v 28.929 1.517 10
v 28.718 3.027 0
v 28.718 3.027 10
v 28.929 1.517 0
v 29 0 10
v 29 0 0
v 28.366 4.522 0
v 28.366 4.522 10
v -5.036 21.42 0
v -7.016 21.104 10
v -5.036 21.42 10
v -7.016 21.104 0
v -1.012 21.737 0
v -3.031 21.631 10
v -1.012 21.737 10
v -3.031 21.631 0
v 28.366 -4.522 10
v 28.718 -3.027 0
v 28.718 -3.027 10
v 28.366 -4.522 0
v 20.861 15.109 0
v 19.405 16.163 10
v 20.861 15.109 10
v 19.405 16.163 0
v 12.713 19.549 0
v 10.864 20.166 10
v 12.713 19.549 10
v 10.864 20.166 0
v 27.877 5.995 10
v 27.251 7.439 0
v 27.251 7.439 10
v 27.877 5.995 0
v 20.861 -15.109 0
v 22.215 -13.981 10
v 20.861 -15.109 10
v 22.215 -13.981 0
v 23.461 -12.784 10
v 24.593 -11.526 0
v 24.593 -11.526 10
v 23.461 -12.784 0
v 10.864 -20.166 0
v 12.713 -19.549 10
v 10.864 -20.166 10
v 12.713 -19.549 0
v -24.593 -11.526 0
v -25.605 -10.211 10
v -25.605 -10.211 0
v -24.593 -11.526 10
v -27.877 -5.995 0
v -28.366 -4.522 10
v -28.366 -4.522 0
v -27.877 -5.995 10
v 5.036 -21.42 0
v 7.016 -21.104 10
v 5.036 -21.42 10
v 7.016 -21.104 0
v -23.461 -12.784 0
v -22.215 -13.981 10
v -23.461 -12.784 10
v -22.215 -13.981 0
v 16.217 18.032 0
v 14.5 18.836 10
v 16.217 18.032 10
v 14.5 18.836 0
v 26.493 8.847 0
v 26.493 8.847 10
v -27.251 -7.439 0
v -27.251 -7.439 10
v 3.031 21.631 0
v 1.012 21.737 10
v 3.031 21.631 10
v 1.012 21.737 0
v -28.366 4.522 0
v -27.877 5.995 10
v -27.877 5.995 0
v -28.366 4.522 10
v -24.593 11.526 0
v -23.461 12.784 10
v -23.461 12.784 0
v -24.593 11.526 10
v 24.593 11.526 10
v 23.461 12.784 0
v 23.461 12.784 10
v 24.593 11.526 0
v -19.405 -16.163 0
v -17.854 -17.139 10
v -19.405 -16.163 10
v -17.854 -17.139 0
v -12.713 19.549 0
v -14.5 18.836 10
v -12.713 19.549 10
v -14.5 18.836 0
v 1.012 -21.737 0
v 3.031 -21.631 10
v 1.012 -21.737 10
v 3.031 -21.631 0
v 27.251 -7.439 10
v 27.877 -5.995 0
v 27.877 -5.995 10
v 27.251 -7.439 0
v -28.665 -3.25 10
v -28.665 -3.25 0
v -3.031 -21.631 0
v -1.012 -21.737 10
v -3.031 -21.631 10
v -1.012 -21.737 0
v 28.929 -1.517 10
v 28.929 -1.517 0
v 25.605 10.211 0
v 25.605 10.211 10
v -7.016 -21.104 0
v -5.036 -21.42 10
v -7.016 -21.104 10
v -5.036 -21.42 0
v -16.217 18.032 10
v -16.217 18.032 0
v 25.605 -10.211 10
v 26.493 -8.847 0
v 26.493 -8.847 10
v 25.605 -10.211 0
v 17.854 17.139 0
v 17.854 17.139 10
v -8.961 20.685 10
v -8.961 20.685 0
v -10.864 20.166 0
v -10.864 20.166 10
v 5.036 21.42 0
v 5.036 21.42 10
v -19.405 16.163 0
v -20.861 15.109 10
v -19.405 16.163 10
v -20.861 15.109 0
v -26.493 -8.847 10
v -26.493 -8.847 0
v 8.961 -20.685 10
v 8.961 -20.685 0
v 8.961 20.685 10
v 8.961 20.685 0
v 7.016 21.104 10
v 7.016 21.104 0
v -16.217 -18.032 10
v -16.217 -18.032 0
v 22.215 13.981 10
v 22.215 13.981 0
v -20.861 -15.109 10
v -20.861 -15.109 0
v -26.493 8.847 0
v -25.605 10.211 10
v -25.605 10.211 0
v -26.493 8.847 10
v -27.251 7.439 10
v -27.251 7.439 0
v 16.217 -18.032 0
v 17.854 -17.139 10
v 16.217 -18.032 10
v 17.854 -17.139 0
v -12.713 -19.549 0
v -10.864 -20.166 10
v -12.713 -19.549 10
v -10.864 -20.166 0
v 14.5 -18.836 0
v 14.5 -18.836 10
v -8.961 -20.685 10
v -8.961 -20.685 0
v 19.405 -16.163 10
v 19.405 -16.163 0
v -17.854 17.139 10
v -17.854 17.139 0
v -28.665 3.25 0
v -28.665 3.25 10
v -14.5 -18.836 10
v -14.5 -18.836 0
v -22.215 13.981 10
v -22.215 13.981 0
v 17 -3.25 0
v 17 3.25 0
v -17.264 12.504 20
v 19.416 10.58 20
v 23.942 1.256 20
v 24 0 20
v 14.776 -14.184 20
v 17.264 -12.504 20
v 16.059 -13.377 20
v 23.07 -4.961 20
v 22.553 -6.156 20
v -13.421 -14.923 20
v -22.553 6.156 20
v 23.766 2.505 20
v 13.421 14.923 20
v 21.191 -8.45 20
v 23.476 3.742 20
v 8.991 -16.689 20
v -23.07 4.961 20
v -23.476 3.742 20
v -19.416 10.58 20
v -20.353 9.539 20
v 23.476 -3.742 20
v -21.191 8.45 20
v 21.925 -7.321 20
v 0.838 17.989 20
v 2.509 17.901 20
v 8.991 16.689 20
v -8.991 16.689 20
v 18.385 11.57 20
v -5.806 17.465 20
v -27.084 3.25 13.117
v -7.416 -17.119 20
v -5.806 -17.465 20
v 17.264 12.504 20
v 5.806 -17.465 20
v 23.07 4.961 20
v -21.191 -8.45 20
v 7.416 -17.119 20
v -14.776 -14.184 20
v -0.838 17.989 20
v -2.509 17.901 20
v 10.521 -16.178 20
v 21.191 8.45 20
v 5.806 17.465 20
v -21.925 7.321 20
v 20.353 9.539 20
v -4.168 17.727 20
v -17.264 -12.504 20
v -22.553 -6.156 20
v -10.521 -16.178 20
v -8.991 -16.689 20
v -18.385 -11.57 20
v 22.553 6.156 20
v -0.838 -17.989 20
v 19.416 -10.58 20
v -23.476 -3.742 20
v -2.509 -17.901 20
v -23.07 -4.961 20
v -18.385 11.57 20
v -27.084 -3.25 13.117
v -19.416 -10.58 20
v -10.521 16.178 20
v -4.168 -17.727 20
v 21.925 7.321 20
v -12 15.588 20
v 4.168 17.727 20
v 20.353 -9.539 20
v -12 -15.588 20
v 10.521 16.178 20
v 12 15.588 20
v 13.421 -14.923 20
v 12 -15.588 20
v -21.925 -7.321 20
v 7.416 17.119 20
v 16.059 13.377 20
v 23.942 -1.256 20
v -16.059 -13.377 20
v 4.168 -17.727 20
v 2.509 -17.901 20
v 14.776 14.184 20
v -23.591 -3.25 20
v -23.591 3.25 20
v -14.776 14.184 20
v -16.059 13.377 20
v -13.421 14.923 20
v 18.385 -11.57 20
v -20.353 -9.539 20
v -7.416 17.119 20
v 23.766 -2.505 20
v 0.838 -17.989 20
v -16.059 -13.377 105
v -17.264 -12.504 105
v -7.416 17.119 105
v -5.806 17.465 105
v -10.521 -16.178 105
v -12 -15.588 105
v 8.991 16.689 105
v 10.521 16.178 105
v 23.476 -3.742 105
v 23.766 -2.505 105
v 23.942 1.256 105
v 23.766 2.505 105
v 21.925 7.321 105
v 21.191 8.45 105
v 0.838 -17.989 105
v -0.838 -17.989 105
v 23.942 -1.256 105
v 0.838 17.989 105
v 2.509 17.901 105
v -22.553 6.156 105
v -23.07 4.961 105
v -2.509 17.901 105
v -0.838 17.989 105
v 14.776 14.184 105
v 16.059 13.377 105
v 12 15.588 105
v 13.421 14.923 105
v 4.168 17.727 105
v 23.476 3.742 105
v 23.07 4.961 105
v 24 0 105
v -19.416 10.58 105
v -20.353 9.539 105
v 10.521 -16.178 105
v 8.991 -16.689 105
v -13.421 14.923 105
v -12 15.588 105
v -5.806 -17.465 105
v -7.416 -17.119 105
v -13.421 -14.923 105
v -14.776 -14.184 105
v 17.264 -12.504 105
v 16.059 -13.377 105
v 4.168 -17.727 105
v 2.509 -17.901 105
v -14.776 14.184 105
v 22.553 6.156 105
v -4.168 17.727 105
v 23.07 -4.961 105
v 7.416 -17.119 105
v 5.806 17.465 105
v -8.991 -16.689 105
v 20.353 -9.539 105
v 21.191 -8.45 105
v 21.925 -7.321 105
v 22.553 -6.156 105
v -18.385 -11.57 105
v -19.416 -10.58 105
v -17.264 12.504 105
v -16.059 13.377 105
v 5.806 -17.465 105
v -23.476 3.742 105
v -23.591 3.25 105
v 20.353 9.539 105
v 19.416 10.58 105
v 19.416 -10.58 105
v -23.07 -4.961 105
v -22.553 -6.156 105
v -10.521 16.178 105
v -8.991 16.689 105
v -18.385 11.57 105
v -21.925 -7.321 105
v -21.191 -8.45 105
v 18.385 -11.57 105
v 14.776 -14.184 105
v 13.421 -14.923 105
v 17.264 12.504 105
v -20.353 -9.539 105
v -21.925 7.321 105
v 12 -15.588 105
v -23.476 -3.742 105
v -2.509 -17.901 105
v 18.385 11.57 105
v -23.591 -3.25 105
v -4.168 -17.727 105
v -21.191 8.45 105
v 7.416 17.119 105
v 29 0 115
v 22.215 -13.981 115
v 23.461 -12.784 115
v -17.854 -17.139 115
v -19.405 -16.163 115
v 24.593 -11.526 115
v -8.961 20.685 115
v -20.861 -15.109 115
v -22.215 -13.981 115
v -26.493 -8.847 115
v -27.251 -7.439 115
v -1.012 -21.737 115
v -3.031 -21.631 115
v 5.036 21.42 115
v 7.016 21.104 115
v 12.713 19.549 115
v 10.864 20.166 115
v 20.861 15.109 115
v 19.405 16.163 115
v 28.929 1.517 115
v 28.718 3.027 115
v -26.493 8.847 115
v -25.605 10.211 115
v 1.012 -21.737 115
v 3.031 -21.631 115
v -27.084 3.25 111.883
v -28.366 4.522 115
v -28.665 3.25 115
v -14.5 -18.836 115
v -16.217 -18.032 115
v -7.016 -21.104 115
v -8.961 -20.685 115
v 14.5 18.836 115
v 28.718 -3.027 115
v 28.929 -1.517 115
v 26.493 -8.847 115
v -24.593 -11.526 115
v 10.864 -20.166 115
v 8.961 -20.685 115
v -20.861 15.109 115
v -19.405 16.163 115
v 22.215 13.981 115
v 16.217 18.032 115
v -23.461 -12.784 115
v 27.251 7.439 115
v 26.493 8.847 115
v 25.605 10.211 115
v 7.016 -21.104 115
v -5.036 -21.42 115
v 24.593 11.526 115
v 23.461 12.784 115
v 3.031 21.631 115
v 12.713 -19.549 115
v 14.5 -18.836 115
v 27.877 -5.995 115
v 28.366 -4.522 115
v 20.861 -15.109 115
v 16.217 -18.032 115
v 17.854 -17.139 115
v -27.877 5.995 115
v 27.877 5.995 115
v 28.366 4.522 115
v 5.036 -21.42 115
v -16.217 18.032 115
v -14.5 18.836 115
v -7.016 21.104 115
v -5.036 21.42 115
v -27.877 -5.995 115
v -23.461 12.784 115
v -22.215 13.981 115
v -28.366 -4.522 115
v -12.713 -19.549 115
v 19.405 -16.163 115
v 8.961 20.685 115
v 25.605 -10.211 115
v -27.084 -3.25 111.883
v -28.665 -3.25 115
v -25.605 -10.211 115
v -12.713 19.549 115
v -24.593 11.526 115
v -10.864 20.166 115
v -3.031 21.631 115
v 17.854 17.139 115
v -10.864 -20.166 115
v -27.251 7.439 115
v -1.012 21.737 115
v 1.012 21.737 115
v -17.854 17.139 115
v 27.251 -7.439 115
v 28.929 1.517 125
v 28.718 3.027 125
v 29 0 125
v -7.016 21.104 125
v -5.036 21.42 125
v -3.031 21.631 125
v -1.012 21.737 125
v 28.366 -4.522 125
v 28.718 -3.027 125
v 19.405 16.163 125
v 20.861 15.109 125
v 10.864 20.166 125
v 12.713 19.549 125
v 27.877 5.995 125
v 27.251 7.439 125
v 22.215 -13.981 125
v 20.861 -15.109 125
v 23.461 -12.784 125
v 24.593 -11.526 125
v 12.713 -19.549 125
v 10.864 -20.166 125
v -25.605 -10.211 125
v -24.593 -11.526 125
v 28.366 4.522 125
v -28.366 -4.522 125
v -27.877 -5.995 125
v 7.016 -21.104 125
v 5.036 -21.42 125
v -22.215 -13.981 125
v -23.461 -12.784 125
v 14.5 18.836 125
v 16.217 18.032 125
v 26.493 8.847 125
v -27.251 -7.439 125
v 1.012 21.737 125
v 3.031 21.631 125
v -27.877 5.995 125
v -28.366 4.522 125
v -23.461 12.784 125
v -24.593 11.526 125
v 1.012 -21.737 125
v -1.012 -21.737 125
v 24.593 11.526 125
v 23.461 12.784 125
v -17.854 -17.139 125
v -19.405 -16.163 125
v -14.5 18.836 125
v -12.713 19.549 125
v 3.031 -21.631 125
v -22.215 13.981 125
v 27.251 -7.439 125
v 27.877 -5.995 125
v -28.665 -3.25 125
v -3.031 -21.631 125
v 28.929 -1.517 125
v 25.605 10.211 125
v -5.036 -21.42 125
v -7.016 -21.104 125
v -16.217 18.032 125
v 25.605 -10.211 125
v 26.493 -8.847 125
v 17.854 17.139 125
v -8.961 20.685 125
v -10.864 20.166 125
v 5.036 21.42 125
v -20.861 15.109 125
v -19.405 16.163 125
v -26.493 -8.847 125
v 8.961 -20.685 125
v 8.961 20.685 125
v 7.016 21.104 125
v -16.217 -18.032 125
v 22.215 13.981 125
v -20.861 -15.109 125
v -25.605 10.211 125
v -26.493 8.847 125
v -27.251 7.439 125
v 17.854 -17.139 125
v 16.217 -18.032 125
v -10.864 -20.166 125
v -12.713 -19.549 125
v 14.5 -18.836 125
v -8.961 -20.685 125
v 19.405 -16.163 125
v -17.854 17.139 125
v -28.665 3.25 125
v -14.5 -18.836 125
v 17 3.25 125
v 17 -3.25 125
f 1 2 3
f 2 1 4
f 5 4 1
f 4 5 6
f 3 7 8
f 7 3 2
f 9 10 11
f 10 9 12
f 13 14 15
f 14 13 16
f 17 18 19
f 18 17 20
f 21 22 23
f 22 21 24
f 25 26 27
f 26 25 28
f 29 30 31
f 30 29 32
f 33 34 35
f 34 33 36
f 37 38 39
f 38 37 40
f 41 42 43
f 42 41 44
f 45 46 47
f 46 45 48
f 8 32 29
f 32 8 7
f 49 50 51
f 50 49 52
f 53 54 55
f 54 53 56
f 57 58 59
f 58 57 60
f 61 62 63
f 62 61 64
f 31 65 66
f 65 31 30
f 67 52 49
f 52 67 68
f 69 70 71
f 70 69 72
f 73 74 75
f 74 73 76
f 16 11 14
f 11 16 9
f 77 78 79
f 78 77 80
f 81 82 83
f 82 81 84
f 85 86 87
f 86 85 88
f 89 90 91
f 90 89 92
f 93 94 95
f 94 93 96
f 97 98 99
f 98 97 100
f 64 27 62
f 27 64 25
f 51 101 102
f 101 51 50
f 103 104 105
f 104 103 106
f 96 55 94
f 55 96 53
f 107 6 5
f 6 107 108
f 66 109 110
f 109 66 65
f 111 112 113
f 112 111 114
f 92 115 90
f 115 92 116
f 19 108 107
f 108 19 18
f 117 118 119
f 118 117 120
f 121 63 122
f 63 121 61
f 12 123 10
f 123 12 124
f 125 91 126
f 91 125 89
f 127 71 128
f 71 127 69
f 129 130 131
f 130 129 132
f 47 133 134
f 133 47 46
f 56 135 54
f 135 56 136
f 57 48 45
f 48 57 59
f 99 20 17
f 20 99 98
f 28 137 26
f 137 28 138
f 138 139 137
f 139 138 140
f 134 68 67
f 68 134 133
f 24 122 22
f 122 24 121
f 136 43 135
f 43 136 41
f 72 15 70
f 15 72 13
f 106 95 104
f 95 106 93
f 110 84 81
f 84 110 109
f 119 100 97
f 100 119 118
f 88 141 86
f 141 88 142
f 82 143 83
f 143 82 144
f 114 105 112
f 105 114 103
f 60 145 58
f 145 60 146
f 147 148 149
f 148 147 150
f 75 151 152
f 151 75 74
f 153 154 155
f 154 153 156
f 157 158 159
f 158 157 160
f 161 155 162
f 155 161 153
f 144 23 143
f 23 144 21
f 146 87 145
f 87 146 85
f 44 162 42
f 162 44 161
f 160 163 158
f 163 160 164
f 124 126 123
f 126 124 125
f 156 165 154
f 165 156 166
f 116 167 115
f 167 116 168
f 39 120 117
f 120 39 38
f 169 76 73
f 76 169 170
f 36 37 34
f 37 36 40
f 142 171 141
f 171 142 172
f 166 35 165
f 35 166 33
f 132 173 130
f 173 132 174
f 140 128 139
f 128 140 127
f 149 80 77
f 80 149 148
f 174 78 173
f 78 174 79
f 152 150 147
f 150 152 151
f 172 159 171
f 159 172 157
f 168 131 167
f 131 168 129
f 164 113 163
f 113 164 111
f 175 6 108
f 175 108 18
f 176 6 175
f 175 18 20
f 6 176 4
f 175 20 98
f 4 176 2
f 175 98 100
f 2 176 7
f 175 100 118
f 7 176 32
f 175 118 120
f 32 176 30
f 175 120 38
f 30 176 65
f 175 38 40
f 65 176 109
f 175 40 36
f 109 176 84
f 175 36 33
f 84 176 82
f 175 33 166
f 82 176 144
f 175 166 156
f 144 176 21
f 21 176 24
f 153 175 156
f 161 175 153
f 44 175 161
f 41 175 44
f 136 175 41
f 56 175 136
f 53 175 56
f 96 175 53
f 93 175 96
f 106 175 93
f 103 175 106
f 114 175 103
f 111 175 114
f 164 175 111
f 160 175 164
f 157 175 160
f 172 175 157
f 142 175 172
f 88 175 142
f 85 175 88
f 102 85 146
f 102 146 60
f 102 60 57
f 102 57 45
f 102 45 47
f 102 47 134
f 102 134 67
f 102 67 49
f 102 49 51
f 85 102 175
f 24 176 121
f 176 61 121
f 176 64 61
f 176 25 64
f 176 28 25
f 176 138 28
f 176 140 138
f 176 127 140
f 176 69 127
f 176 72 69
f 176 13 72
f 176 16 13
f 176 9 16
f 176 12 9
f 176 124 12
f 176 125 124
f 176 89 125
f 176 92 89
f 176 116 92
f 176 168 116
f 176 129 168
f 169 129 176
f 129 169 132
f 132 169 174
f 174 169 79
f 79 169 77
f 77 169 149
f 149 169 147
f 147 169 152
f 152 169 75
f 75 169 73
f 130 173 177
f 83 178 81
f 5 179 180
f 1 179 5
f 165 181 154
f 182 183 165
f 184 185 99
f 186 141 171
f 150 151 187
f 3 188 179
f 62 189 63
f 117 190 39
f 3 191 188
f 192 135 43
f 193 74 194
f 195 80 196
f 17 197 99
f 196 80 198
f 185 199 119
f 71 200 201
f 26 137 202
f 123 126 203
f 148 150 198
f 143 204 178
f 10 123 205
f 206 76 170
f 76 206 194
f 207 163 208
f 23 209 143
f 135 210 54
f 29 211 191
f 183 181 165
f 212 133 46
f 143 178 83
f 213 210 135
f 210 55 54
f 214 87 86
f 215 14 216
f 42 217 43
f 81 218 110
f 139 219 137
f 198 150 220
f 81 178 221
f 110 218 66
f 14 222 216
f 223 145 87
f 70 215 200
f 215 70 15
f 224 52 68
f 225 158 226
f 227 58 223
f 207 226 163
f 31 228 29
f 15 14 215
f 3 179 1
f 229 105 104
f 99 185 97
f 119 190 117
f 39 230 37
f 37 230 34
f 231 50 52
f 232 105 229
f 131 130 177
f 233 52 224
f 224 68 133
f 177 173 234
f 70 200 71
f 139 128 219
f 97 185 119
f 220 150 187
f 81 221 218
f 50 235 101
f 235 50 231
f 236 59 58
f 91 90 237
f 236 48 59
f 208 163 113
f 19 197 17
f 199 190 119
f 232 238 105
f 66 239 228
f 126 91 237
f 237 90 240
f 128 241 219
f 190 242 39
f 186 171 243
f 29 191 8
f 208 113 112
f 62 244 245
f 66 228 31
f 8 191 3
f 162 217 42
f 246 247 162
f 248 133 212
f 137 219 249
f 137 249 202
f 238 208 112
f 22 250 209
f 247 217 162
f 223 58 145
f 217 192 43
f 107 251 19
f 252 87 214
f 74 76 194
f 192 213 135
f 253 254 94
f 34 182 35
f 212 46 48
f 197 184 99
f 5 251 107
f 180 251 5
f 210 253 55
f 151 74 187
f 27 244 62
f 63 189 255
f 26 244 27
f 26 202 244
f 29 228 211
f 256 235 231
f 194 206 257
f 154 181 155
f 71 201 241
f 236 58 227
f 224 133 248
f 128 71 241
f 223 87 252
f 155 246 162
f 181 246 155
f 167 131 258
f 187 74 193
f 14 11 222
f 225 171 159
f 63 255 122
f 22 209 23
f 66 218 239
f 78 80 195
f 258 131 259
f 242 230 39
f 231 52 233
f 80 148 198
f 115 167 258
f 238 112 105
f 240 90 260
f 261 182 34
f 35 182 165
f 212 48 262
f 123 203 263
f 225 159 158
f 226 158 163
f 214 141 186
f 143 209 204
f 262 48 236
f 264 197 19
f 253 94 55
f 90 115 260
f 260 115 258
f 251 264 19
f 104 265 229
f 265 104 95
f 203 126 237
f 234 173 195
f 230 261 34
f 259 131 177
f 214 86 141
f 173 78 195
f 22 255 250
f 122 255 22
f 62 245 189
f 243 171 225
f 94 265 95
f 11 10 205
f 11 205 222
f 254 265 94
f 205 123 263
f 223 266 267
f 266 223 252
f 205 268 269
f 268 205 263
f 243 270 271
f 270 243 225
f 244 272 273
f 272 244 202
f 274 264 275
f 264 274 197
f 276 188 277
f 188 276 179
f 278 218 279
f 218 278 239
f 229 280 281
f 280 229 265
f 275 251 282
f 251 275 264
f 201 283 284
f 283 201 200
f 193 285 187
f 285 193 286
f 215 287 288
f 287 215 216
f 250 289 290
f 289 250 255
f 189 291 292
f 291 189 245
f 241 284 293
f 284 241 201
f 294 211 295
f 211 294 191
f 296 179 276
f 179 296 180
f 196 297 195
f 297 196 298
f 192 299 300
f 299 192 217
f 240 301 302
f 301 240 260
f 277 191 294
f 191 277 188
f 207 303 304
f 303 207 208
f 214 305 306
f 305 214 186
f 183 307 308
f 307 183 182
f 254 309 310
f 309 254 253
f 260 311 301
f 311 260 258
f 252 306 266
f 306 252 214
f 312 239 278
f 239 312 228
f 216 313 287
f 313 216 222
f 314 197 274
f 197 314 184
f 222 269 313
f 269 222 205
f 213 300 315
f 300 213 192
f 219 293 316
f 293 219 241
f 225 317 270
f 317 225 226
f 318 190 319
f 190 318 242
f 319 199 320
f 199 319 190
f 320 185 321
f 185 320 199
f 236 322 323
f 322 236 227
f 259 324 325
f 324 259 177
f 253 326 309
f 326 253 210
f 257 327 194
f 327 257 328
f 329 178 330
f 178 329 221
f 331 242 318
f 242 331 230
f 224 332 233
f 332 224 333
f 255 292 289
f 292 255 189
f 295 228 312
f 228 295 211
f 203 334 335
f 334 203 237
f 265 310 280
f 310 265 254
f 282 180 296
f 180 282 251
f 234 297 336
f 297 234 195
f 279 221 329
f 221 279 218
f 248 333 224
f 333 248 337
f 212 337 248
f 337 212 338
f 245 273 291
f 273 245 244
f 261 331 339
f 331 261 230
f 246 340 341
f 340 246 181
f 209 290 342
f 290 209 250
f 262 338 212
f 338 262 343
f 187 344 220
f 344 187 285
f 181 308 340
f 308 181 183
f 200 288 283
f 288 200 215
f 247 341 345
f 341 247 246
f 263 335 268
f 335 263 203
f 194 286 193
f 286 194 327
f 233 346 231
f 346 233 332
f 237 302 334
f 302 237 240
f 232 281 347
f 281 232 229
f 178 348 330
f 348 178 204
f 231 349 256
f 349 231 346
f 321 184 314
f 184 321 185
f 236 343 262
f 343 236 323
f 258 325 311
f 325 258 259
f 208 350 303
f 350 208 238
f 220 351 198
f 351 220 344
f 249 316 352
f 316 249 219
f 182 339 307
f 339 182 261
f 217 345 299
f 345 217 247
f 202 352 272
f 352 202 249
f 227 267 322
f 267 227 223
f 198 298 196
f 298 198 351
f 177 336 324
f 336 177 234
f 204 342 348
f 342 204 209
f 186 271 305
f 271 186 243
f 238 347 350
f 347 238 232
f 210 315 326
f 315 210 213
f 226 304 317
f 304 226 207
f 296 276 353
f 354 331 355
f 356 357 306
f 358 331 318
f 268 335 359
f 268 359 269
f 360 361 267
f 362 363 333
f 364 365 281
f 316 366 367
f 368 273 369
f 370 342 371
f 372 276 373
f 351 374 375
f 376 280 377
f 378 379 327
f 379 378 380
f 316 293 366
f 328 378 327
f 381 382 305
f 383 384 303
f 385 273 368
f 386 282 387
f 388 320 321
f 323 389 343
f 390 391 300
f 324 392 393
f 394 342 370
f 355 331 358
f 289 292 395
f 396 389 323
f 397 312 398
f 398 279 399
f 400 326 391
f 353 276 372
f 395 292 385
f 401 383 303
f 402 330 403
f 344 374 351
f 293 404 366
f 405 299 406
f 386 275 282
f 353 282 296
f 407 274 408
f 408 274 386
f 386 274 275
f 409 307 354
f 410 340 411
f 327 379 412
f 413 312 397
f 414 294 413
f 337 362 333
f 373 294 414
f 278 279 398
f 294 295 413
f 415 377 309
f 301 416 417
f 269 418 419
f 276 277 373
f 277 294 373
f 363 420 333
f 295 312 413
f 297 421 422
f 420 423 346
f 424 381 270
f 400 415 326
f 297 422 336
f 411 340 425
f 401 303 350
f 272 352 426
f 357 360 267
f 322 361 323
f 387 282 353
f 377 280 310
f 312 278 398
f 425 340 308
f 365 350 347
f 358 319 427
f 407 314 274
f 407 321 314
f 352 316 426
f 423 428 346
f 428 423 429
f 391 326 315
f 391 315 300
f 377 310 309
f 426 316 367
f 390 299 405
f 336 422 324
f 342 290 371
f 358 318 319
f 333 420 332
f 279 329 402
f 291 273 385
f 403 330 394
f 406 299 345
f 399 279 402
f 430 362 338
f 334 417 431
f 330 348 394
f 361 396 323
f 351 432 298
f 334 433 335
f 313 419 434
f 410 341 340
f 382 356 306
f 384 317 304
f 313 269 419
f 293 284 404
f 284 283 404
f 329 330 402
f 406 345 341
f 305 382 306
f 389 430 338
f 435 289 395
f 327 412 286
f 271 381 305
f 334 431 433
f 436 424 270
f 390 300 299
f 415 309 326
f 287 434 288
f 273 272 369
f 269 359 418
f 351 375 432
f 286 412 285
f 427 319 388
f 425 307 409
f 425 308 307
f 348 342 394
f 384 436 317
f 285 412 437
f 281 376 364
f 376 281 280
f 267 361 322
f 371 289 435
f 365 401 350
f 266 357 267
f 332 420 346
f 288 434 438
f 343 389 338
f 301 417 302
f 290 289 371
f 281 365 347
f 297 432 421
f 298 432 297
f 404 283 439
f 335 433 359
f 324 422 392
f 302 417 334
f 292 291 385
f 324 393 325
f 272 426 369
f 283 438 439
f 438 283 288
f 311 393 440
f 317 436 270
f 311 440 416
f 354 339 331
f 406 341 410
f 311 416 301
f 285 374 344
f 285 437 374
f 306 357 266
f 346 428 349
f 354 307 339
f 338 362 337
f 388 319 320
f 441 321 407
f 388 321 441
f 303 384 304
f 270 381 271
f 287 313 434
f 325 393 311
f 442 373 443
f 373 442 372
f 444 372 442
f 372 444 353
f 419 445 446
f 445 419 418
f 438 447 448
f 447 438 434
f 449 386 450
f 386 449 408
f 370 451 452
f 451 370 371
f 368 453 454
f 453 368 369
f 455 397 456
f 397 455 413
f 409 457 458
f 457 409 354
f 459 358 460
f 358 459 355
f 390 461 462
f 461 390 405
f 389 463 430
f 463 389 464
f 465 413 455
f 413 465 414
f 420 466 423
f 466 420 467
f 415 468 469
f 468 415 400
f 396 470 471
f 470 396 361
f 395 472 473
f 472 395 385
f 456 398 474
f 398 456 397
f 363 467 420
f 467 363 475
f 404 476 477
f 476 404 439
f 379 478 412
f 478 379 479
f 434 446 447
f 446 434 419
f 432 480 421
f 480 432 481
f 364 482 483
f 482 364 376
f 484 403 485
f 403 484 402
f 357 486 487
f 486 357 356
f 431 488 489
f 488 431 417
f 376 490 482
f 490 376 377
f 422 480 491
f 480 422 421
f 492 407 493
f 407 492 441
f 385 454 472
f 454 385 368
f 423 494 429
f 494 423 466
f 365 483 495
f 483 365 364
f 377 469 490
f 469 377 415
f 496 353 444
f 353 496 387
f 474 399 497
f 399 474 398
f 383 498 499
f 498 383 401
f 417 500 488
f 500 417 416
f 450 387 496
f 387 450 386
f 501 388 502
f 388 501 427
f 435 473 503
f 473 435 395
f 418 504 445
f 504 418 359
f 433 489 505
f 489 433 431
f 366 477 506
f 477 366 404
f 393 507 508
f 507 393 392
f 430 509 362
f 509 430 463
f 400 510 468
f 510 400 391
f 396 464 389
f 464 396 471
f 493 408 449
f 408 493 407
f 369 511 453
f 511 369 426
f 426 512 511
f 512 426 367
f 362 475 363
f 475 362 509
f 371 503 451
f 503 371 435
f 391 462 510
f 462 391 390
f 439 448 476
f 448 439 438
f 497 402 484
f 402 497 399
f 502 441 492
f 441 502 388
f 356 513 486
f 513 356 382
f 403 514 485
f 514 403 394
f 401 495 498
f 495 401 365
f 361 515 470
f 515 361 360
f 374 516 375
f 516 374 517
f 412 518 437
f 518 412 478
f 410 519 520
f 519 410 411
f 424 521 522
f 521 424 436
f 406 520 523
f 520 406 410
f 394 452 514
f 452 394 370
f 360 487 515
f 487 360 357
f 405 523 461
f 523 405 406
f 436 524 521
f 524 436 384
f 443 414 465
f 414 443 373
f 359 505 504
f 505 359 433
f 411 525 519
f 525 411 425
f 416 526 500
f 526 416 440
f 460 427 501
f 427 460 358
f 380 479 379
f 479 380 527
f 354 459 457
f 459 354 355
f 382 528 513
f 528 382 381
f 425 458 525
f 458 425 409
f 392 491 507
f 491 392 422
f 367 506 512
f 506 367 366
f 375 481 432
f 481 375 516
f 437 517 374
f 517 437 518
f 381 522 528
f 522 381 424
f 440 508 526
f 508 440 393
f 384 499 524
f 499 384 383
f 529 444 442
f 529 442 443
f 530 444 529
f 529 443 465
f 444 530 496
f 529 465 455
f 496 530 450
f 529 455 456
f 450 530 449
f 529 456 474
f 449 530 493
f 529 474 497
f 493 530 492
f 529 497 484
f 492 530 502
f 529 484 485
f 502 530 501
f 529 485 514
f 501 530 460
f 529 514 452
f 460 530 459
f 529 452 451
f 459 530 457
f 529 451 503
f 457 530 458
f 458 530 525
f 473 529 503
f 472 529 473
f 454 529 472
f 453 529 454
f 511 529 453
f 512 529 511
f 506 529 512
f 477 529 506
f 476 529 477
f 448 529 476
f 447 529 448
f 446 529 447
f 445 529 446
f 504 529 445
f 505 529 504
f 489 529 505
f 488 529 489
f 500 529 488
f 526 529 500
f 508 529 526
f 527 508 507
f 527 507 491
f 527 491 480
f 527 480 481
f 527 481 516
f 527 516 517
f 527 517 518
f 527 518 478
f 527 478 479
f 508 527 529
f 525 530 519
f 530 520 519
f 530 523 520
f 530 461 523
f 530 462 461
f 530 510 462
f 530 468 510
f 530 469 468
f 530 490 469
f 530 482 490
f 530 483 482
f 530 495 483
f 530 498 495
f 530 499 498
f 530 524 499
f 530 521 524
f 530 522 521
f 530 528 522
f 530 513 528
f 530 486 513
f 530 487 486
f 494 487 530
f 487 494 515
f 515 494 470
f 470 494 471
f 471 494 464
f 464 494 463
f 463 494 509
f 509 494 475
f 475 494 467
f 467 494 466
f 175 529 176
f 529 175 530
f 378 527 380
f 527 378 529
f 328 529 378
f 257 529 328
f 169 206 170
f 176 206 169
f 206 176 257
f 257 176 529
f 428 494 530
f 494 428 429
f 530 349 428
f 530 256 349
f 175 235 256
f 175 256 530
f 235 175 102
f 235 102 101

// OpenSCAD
eps = 0.01;
$fn = 90;

// Prusa frame praters
// frame height
f_h = 41;
// frame thickness
f_t = 6.5;

// handle parameter
// handle lenght
h_l = 85;
// handle diameter
h_d = f_h+7;

// stoppers paramters
s_p = 10;
s_D = h_d + s_p;
s_l = s_p;

module handle()
{
    difference()
    {
        // handle
        scale([1,0.75,1])
        union()
        {
            cylinder(d=s_D, h=s_l);
            translate([0,0,s_l]) cylinder(d1=s_D, d2=h_d, h=s_l);
            translate([0,0,2*s_l]) cylinder(d=h_d, h=h_l);
            translate([0,0,2*s_l+h_l]) cylinder(d1=h_d, d2=s_D, h=s_l);
            translate([0,0,3*s_l+h_l]) cylinder(d=s_D, h=s_l);
        }
        
        // frame cut
        _c_l = h_l+4*s_l;
        #translate([-h_d/2-s_p-eps,-f_t/2,-eps]) cube([f_h+eps+s_p,f_t,_c_l+2*eps]);
        
        
    }
}

handle();
